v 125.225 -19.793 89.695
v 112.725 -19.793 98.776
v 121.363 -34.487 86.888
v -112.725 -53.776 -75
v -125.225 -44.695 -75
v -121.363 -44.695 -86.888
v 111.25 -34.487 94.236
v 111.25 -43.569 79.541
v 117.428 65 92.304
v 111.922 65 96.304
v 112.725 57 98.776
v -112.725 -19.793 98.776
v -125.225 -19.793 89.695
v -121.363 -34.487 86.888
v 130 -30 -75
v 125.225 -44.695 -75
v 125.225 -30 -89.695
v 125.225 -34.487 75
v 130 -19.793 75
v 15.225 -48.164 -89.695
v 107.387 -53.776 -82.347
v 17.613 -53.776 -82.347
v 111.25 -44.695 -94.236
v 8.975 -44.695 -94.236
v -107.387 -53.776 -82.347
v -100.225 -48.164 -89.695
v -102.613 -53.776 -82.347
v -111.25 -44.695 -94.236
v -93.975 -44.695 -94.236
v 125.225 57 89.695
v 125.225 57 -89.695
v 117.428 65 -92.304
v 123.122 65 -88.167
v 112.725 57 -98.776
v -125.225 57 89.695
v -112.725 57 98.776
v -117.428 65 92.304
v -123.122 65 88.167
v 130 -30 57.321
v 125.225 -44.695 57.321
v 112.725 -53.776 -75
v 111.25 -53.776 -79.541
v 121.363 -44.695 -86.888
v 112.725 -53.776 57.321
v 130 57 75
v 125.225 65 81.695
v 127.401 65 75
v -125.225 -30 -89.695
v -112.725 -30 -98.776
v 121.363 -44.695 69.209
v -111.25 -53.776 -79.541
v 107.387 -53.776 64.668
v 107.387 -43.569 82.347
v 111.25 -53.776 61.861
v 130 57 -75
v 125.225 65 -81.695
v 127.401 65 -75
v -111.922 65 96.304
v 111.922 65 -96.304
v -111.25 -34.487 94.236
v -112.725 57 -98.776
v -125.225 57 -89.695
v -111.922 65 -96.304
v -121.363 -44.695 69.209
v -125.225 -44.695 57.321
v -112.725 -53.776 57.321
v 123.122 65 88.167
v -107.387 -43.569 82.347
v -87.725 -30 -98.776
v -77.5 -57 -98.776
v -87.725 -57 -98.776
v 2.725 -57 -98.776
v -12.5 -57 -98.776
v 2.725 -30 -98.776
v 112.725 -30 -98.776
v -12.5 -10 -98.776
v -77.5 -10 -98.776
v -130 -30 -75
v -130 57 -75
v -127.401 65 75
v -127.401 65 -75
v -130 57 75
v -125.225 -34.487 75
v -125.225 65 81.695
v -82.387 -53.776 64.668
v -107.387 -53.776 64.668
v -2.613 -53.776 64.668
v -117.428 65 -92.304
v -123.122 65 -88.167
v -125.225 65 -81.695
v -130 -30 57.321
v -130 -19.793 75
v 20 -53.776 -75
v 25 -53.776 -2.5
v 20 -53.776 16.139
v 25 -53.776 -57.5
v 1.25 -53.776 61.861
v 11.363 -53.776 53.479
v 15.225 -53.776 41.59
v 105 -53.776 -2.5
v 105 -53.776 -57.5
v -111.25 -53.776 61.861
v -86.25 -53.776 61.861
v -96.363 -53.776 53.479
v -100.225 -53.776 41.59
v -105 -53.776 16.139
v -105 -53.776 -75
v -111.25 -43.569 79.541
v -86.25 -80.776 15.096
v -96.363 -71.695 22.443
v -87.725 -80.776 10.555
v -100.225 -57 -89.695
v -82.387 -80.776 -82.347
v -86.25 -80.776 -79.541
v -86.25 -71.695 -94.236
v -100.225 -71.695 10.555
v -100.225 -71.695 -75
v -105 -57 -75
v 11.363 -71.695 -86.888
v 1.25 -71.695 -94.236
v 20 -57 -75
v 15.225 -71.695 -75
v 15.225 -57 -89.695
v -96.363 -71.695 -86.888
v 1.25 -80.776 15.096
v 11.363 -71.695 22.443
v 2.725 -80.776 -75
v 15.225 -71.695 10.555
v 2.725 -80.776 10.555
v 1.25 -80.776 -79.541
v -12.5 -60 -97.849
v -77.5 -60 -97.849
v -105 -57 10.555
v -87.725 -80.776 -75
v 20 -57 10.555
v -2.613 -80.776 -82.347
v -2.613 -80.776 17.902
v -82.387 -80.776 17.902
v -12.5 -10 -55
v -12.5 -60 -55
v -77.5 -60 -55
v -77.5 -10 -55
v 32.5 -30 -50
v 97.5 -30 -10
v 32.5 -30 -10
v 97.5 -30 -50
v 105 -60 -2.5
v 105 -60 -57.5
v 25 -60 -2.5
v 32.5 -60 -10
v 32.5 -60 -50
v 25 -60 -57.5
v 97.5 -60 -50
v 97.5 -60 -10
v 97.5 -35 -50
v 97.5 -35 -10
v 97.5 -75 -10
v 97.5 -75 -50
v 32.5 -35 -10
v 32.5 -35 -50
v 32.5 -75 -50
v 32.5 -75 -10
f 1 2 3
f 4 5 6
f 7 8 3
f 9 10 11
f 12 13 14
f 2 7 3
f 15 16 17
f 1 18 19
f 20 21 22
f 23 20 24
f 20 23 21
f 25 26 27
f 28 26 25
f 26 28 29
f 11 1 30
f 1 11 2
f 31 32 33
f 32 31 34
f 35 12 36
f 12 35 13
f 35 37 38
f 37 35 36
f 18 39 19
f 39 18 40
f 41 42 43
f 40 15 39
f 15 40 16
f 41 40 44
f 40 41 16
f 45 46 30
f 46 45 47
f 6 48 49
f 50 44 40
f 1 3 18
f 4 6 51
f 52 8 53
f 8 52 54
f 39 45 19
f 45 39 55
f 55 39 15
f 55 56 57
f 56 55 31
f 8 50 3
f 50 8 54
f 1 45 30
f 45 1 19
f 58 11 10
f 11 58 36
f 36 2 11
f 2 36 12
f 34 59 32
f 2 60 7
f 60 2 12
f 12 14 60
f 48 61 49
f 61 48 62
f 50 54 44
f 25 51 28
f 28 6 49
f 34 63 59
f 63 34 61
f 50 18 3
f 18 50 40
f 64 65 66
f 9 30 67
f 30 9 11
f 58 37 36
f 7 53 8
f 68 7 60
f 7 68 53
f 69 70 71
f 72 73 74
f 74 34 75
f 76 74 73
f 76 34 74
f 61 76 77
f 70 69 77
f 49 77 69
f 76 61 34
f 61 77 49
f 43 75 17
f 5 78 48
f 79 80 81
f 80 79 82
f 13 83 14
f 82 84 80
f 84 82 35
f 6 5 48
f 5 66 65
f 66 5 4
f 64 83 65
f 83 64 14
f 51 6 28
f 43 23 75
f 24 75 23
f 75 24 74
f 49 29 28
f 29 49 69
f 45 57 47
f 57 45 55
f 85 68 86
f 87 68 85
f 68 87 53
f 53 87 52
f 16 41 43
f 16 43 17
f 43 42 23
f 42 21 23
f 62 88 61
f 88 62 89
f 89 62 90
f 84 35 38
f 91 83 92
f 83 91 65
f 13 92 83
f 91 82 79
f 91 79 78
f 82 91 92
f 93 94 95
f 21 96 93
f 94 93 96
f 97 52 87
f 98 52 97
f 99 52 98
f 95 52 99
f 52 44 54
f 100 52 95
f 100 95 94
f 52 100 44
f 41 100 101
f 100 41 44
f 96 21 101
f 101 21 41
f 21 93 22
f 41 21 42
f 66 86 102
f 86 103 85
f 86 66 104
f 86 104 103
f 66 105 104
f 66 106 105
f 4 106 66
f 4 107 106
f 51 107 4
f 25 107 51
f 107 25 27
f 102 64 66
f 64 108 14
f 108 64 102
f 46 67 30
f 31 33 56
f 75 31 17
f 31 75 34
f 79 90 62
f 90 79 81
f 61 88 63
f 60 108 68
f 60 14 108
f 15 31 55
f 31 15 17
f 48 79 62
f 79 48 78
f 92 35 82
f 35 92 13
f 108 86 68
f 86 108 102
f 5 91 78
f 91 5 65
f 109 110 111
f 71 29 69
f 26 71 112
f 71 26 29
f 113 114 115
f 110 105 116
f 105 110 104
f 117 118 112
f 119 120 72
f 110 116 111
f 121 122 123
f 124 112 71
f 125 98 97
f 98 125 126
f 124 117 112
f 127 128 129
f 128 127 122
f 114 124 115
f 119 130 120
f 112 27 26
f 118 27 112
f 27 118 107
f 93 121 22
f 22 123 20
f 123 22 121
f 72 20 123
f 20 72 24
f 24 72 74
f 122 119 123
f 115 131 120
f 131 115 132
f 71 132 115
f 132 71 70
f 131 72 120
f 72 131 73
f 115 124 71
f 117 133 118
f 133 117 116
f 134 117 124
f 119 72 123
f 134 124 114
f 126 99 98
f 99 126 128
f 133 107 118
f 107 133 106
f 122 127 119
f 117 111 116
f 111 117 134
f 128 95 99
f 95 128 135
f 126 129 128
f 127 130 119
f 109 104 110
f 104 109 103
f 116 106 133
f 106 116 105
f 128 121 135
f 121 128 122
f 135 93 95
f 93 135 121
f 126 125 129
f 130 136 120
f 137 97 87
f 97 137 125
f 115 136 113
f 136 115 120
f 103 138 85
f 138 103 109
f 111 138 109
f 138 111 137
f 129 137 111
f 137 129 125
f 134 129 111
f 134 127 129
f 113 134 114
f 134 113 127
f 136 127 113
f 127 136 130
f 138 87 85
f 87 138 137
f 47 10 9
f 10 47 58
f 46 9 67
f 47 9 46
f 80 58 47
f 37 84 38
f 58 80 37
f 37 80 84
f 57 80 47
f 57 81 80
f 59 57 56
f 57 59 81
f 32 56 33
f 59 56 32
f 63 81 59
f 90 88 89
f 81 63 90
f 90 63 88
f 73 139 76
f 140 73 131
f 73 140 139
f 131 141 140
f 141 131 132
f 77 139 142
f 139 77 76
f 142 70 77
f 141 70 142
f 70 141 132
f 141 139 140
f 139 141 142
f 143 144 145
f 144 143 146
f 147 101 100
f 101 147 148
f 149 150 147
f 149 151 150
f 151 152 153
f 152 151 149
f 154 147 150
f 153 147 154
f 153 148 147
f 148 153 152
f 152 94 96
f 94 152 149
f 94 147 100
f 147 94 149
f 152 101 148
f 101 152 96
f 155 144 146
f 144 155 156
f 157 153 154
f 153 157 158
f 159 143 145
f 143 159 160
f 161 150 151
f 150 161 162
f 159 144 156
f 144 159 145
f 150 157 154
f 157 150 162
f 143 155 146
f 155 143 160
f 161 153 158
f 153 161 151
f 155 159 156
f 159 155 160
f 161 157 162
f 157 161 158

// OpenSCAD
$fn=10;

module HandDryer () {
  color("#e3ecdd")
  difference () {
    minkowski () {
      difference() {
        cube([210, 150, 114], true);
        translate([0, 140, 40])
           rotate([-30, 0, 0])
          cube([300, 300, 100], true);
        translate([-105, 0, 55])
          cube([50, 300, 50], true);
        translate([65, 0, 55])
          cube([140, 300, 50], true);
      }
      sphere(25);
    }
    translate([0, 0, -85])
      cube([300, 300, 40], true);
    translate([-45, -80, 35])
      cube([65, 50, 50], true);
    translate([65, -30, 50])
      cube([70, 45, 40], true);
  }
  difference () {
    color("#dddddd")
      translate([65, -30, 40])
      cube([80, 55, 40], true);
    translate([65, -30, 40])
      cube([65, 40, 45], true);
  }
}

module Button () {
  color("#eeeeee")
    translate([65, -55, -30])
    cube([65, 40, 40], true);
}

rotate([90, 0, 0])
HandDryer();
Button();
